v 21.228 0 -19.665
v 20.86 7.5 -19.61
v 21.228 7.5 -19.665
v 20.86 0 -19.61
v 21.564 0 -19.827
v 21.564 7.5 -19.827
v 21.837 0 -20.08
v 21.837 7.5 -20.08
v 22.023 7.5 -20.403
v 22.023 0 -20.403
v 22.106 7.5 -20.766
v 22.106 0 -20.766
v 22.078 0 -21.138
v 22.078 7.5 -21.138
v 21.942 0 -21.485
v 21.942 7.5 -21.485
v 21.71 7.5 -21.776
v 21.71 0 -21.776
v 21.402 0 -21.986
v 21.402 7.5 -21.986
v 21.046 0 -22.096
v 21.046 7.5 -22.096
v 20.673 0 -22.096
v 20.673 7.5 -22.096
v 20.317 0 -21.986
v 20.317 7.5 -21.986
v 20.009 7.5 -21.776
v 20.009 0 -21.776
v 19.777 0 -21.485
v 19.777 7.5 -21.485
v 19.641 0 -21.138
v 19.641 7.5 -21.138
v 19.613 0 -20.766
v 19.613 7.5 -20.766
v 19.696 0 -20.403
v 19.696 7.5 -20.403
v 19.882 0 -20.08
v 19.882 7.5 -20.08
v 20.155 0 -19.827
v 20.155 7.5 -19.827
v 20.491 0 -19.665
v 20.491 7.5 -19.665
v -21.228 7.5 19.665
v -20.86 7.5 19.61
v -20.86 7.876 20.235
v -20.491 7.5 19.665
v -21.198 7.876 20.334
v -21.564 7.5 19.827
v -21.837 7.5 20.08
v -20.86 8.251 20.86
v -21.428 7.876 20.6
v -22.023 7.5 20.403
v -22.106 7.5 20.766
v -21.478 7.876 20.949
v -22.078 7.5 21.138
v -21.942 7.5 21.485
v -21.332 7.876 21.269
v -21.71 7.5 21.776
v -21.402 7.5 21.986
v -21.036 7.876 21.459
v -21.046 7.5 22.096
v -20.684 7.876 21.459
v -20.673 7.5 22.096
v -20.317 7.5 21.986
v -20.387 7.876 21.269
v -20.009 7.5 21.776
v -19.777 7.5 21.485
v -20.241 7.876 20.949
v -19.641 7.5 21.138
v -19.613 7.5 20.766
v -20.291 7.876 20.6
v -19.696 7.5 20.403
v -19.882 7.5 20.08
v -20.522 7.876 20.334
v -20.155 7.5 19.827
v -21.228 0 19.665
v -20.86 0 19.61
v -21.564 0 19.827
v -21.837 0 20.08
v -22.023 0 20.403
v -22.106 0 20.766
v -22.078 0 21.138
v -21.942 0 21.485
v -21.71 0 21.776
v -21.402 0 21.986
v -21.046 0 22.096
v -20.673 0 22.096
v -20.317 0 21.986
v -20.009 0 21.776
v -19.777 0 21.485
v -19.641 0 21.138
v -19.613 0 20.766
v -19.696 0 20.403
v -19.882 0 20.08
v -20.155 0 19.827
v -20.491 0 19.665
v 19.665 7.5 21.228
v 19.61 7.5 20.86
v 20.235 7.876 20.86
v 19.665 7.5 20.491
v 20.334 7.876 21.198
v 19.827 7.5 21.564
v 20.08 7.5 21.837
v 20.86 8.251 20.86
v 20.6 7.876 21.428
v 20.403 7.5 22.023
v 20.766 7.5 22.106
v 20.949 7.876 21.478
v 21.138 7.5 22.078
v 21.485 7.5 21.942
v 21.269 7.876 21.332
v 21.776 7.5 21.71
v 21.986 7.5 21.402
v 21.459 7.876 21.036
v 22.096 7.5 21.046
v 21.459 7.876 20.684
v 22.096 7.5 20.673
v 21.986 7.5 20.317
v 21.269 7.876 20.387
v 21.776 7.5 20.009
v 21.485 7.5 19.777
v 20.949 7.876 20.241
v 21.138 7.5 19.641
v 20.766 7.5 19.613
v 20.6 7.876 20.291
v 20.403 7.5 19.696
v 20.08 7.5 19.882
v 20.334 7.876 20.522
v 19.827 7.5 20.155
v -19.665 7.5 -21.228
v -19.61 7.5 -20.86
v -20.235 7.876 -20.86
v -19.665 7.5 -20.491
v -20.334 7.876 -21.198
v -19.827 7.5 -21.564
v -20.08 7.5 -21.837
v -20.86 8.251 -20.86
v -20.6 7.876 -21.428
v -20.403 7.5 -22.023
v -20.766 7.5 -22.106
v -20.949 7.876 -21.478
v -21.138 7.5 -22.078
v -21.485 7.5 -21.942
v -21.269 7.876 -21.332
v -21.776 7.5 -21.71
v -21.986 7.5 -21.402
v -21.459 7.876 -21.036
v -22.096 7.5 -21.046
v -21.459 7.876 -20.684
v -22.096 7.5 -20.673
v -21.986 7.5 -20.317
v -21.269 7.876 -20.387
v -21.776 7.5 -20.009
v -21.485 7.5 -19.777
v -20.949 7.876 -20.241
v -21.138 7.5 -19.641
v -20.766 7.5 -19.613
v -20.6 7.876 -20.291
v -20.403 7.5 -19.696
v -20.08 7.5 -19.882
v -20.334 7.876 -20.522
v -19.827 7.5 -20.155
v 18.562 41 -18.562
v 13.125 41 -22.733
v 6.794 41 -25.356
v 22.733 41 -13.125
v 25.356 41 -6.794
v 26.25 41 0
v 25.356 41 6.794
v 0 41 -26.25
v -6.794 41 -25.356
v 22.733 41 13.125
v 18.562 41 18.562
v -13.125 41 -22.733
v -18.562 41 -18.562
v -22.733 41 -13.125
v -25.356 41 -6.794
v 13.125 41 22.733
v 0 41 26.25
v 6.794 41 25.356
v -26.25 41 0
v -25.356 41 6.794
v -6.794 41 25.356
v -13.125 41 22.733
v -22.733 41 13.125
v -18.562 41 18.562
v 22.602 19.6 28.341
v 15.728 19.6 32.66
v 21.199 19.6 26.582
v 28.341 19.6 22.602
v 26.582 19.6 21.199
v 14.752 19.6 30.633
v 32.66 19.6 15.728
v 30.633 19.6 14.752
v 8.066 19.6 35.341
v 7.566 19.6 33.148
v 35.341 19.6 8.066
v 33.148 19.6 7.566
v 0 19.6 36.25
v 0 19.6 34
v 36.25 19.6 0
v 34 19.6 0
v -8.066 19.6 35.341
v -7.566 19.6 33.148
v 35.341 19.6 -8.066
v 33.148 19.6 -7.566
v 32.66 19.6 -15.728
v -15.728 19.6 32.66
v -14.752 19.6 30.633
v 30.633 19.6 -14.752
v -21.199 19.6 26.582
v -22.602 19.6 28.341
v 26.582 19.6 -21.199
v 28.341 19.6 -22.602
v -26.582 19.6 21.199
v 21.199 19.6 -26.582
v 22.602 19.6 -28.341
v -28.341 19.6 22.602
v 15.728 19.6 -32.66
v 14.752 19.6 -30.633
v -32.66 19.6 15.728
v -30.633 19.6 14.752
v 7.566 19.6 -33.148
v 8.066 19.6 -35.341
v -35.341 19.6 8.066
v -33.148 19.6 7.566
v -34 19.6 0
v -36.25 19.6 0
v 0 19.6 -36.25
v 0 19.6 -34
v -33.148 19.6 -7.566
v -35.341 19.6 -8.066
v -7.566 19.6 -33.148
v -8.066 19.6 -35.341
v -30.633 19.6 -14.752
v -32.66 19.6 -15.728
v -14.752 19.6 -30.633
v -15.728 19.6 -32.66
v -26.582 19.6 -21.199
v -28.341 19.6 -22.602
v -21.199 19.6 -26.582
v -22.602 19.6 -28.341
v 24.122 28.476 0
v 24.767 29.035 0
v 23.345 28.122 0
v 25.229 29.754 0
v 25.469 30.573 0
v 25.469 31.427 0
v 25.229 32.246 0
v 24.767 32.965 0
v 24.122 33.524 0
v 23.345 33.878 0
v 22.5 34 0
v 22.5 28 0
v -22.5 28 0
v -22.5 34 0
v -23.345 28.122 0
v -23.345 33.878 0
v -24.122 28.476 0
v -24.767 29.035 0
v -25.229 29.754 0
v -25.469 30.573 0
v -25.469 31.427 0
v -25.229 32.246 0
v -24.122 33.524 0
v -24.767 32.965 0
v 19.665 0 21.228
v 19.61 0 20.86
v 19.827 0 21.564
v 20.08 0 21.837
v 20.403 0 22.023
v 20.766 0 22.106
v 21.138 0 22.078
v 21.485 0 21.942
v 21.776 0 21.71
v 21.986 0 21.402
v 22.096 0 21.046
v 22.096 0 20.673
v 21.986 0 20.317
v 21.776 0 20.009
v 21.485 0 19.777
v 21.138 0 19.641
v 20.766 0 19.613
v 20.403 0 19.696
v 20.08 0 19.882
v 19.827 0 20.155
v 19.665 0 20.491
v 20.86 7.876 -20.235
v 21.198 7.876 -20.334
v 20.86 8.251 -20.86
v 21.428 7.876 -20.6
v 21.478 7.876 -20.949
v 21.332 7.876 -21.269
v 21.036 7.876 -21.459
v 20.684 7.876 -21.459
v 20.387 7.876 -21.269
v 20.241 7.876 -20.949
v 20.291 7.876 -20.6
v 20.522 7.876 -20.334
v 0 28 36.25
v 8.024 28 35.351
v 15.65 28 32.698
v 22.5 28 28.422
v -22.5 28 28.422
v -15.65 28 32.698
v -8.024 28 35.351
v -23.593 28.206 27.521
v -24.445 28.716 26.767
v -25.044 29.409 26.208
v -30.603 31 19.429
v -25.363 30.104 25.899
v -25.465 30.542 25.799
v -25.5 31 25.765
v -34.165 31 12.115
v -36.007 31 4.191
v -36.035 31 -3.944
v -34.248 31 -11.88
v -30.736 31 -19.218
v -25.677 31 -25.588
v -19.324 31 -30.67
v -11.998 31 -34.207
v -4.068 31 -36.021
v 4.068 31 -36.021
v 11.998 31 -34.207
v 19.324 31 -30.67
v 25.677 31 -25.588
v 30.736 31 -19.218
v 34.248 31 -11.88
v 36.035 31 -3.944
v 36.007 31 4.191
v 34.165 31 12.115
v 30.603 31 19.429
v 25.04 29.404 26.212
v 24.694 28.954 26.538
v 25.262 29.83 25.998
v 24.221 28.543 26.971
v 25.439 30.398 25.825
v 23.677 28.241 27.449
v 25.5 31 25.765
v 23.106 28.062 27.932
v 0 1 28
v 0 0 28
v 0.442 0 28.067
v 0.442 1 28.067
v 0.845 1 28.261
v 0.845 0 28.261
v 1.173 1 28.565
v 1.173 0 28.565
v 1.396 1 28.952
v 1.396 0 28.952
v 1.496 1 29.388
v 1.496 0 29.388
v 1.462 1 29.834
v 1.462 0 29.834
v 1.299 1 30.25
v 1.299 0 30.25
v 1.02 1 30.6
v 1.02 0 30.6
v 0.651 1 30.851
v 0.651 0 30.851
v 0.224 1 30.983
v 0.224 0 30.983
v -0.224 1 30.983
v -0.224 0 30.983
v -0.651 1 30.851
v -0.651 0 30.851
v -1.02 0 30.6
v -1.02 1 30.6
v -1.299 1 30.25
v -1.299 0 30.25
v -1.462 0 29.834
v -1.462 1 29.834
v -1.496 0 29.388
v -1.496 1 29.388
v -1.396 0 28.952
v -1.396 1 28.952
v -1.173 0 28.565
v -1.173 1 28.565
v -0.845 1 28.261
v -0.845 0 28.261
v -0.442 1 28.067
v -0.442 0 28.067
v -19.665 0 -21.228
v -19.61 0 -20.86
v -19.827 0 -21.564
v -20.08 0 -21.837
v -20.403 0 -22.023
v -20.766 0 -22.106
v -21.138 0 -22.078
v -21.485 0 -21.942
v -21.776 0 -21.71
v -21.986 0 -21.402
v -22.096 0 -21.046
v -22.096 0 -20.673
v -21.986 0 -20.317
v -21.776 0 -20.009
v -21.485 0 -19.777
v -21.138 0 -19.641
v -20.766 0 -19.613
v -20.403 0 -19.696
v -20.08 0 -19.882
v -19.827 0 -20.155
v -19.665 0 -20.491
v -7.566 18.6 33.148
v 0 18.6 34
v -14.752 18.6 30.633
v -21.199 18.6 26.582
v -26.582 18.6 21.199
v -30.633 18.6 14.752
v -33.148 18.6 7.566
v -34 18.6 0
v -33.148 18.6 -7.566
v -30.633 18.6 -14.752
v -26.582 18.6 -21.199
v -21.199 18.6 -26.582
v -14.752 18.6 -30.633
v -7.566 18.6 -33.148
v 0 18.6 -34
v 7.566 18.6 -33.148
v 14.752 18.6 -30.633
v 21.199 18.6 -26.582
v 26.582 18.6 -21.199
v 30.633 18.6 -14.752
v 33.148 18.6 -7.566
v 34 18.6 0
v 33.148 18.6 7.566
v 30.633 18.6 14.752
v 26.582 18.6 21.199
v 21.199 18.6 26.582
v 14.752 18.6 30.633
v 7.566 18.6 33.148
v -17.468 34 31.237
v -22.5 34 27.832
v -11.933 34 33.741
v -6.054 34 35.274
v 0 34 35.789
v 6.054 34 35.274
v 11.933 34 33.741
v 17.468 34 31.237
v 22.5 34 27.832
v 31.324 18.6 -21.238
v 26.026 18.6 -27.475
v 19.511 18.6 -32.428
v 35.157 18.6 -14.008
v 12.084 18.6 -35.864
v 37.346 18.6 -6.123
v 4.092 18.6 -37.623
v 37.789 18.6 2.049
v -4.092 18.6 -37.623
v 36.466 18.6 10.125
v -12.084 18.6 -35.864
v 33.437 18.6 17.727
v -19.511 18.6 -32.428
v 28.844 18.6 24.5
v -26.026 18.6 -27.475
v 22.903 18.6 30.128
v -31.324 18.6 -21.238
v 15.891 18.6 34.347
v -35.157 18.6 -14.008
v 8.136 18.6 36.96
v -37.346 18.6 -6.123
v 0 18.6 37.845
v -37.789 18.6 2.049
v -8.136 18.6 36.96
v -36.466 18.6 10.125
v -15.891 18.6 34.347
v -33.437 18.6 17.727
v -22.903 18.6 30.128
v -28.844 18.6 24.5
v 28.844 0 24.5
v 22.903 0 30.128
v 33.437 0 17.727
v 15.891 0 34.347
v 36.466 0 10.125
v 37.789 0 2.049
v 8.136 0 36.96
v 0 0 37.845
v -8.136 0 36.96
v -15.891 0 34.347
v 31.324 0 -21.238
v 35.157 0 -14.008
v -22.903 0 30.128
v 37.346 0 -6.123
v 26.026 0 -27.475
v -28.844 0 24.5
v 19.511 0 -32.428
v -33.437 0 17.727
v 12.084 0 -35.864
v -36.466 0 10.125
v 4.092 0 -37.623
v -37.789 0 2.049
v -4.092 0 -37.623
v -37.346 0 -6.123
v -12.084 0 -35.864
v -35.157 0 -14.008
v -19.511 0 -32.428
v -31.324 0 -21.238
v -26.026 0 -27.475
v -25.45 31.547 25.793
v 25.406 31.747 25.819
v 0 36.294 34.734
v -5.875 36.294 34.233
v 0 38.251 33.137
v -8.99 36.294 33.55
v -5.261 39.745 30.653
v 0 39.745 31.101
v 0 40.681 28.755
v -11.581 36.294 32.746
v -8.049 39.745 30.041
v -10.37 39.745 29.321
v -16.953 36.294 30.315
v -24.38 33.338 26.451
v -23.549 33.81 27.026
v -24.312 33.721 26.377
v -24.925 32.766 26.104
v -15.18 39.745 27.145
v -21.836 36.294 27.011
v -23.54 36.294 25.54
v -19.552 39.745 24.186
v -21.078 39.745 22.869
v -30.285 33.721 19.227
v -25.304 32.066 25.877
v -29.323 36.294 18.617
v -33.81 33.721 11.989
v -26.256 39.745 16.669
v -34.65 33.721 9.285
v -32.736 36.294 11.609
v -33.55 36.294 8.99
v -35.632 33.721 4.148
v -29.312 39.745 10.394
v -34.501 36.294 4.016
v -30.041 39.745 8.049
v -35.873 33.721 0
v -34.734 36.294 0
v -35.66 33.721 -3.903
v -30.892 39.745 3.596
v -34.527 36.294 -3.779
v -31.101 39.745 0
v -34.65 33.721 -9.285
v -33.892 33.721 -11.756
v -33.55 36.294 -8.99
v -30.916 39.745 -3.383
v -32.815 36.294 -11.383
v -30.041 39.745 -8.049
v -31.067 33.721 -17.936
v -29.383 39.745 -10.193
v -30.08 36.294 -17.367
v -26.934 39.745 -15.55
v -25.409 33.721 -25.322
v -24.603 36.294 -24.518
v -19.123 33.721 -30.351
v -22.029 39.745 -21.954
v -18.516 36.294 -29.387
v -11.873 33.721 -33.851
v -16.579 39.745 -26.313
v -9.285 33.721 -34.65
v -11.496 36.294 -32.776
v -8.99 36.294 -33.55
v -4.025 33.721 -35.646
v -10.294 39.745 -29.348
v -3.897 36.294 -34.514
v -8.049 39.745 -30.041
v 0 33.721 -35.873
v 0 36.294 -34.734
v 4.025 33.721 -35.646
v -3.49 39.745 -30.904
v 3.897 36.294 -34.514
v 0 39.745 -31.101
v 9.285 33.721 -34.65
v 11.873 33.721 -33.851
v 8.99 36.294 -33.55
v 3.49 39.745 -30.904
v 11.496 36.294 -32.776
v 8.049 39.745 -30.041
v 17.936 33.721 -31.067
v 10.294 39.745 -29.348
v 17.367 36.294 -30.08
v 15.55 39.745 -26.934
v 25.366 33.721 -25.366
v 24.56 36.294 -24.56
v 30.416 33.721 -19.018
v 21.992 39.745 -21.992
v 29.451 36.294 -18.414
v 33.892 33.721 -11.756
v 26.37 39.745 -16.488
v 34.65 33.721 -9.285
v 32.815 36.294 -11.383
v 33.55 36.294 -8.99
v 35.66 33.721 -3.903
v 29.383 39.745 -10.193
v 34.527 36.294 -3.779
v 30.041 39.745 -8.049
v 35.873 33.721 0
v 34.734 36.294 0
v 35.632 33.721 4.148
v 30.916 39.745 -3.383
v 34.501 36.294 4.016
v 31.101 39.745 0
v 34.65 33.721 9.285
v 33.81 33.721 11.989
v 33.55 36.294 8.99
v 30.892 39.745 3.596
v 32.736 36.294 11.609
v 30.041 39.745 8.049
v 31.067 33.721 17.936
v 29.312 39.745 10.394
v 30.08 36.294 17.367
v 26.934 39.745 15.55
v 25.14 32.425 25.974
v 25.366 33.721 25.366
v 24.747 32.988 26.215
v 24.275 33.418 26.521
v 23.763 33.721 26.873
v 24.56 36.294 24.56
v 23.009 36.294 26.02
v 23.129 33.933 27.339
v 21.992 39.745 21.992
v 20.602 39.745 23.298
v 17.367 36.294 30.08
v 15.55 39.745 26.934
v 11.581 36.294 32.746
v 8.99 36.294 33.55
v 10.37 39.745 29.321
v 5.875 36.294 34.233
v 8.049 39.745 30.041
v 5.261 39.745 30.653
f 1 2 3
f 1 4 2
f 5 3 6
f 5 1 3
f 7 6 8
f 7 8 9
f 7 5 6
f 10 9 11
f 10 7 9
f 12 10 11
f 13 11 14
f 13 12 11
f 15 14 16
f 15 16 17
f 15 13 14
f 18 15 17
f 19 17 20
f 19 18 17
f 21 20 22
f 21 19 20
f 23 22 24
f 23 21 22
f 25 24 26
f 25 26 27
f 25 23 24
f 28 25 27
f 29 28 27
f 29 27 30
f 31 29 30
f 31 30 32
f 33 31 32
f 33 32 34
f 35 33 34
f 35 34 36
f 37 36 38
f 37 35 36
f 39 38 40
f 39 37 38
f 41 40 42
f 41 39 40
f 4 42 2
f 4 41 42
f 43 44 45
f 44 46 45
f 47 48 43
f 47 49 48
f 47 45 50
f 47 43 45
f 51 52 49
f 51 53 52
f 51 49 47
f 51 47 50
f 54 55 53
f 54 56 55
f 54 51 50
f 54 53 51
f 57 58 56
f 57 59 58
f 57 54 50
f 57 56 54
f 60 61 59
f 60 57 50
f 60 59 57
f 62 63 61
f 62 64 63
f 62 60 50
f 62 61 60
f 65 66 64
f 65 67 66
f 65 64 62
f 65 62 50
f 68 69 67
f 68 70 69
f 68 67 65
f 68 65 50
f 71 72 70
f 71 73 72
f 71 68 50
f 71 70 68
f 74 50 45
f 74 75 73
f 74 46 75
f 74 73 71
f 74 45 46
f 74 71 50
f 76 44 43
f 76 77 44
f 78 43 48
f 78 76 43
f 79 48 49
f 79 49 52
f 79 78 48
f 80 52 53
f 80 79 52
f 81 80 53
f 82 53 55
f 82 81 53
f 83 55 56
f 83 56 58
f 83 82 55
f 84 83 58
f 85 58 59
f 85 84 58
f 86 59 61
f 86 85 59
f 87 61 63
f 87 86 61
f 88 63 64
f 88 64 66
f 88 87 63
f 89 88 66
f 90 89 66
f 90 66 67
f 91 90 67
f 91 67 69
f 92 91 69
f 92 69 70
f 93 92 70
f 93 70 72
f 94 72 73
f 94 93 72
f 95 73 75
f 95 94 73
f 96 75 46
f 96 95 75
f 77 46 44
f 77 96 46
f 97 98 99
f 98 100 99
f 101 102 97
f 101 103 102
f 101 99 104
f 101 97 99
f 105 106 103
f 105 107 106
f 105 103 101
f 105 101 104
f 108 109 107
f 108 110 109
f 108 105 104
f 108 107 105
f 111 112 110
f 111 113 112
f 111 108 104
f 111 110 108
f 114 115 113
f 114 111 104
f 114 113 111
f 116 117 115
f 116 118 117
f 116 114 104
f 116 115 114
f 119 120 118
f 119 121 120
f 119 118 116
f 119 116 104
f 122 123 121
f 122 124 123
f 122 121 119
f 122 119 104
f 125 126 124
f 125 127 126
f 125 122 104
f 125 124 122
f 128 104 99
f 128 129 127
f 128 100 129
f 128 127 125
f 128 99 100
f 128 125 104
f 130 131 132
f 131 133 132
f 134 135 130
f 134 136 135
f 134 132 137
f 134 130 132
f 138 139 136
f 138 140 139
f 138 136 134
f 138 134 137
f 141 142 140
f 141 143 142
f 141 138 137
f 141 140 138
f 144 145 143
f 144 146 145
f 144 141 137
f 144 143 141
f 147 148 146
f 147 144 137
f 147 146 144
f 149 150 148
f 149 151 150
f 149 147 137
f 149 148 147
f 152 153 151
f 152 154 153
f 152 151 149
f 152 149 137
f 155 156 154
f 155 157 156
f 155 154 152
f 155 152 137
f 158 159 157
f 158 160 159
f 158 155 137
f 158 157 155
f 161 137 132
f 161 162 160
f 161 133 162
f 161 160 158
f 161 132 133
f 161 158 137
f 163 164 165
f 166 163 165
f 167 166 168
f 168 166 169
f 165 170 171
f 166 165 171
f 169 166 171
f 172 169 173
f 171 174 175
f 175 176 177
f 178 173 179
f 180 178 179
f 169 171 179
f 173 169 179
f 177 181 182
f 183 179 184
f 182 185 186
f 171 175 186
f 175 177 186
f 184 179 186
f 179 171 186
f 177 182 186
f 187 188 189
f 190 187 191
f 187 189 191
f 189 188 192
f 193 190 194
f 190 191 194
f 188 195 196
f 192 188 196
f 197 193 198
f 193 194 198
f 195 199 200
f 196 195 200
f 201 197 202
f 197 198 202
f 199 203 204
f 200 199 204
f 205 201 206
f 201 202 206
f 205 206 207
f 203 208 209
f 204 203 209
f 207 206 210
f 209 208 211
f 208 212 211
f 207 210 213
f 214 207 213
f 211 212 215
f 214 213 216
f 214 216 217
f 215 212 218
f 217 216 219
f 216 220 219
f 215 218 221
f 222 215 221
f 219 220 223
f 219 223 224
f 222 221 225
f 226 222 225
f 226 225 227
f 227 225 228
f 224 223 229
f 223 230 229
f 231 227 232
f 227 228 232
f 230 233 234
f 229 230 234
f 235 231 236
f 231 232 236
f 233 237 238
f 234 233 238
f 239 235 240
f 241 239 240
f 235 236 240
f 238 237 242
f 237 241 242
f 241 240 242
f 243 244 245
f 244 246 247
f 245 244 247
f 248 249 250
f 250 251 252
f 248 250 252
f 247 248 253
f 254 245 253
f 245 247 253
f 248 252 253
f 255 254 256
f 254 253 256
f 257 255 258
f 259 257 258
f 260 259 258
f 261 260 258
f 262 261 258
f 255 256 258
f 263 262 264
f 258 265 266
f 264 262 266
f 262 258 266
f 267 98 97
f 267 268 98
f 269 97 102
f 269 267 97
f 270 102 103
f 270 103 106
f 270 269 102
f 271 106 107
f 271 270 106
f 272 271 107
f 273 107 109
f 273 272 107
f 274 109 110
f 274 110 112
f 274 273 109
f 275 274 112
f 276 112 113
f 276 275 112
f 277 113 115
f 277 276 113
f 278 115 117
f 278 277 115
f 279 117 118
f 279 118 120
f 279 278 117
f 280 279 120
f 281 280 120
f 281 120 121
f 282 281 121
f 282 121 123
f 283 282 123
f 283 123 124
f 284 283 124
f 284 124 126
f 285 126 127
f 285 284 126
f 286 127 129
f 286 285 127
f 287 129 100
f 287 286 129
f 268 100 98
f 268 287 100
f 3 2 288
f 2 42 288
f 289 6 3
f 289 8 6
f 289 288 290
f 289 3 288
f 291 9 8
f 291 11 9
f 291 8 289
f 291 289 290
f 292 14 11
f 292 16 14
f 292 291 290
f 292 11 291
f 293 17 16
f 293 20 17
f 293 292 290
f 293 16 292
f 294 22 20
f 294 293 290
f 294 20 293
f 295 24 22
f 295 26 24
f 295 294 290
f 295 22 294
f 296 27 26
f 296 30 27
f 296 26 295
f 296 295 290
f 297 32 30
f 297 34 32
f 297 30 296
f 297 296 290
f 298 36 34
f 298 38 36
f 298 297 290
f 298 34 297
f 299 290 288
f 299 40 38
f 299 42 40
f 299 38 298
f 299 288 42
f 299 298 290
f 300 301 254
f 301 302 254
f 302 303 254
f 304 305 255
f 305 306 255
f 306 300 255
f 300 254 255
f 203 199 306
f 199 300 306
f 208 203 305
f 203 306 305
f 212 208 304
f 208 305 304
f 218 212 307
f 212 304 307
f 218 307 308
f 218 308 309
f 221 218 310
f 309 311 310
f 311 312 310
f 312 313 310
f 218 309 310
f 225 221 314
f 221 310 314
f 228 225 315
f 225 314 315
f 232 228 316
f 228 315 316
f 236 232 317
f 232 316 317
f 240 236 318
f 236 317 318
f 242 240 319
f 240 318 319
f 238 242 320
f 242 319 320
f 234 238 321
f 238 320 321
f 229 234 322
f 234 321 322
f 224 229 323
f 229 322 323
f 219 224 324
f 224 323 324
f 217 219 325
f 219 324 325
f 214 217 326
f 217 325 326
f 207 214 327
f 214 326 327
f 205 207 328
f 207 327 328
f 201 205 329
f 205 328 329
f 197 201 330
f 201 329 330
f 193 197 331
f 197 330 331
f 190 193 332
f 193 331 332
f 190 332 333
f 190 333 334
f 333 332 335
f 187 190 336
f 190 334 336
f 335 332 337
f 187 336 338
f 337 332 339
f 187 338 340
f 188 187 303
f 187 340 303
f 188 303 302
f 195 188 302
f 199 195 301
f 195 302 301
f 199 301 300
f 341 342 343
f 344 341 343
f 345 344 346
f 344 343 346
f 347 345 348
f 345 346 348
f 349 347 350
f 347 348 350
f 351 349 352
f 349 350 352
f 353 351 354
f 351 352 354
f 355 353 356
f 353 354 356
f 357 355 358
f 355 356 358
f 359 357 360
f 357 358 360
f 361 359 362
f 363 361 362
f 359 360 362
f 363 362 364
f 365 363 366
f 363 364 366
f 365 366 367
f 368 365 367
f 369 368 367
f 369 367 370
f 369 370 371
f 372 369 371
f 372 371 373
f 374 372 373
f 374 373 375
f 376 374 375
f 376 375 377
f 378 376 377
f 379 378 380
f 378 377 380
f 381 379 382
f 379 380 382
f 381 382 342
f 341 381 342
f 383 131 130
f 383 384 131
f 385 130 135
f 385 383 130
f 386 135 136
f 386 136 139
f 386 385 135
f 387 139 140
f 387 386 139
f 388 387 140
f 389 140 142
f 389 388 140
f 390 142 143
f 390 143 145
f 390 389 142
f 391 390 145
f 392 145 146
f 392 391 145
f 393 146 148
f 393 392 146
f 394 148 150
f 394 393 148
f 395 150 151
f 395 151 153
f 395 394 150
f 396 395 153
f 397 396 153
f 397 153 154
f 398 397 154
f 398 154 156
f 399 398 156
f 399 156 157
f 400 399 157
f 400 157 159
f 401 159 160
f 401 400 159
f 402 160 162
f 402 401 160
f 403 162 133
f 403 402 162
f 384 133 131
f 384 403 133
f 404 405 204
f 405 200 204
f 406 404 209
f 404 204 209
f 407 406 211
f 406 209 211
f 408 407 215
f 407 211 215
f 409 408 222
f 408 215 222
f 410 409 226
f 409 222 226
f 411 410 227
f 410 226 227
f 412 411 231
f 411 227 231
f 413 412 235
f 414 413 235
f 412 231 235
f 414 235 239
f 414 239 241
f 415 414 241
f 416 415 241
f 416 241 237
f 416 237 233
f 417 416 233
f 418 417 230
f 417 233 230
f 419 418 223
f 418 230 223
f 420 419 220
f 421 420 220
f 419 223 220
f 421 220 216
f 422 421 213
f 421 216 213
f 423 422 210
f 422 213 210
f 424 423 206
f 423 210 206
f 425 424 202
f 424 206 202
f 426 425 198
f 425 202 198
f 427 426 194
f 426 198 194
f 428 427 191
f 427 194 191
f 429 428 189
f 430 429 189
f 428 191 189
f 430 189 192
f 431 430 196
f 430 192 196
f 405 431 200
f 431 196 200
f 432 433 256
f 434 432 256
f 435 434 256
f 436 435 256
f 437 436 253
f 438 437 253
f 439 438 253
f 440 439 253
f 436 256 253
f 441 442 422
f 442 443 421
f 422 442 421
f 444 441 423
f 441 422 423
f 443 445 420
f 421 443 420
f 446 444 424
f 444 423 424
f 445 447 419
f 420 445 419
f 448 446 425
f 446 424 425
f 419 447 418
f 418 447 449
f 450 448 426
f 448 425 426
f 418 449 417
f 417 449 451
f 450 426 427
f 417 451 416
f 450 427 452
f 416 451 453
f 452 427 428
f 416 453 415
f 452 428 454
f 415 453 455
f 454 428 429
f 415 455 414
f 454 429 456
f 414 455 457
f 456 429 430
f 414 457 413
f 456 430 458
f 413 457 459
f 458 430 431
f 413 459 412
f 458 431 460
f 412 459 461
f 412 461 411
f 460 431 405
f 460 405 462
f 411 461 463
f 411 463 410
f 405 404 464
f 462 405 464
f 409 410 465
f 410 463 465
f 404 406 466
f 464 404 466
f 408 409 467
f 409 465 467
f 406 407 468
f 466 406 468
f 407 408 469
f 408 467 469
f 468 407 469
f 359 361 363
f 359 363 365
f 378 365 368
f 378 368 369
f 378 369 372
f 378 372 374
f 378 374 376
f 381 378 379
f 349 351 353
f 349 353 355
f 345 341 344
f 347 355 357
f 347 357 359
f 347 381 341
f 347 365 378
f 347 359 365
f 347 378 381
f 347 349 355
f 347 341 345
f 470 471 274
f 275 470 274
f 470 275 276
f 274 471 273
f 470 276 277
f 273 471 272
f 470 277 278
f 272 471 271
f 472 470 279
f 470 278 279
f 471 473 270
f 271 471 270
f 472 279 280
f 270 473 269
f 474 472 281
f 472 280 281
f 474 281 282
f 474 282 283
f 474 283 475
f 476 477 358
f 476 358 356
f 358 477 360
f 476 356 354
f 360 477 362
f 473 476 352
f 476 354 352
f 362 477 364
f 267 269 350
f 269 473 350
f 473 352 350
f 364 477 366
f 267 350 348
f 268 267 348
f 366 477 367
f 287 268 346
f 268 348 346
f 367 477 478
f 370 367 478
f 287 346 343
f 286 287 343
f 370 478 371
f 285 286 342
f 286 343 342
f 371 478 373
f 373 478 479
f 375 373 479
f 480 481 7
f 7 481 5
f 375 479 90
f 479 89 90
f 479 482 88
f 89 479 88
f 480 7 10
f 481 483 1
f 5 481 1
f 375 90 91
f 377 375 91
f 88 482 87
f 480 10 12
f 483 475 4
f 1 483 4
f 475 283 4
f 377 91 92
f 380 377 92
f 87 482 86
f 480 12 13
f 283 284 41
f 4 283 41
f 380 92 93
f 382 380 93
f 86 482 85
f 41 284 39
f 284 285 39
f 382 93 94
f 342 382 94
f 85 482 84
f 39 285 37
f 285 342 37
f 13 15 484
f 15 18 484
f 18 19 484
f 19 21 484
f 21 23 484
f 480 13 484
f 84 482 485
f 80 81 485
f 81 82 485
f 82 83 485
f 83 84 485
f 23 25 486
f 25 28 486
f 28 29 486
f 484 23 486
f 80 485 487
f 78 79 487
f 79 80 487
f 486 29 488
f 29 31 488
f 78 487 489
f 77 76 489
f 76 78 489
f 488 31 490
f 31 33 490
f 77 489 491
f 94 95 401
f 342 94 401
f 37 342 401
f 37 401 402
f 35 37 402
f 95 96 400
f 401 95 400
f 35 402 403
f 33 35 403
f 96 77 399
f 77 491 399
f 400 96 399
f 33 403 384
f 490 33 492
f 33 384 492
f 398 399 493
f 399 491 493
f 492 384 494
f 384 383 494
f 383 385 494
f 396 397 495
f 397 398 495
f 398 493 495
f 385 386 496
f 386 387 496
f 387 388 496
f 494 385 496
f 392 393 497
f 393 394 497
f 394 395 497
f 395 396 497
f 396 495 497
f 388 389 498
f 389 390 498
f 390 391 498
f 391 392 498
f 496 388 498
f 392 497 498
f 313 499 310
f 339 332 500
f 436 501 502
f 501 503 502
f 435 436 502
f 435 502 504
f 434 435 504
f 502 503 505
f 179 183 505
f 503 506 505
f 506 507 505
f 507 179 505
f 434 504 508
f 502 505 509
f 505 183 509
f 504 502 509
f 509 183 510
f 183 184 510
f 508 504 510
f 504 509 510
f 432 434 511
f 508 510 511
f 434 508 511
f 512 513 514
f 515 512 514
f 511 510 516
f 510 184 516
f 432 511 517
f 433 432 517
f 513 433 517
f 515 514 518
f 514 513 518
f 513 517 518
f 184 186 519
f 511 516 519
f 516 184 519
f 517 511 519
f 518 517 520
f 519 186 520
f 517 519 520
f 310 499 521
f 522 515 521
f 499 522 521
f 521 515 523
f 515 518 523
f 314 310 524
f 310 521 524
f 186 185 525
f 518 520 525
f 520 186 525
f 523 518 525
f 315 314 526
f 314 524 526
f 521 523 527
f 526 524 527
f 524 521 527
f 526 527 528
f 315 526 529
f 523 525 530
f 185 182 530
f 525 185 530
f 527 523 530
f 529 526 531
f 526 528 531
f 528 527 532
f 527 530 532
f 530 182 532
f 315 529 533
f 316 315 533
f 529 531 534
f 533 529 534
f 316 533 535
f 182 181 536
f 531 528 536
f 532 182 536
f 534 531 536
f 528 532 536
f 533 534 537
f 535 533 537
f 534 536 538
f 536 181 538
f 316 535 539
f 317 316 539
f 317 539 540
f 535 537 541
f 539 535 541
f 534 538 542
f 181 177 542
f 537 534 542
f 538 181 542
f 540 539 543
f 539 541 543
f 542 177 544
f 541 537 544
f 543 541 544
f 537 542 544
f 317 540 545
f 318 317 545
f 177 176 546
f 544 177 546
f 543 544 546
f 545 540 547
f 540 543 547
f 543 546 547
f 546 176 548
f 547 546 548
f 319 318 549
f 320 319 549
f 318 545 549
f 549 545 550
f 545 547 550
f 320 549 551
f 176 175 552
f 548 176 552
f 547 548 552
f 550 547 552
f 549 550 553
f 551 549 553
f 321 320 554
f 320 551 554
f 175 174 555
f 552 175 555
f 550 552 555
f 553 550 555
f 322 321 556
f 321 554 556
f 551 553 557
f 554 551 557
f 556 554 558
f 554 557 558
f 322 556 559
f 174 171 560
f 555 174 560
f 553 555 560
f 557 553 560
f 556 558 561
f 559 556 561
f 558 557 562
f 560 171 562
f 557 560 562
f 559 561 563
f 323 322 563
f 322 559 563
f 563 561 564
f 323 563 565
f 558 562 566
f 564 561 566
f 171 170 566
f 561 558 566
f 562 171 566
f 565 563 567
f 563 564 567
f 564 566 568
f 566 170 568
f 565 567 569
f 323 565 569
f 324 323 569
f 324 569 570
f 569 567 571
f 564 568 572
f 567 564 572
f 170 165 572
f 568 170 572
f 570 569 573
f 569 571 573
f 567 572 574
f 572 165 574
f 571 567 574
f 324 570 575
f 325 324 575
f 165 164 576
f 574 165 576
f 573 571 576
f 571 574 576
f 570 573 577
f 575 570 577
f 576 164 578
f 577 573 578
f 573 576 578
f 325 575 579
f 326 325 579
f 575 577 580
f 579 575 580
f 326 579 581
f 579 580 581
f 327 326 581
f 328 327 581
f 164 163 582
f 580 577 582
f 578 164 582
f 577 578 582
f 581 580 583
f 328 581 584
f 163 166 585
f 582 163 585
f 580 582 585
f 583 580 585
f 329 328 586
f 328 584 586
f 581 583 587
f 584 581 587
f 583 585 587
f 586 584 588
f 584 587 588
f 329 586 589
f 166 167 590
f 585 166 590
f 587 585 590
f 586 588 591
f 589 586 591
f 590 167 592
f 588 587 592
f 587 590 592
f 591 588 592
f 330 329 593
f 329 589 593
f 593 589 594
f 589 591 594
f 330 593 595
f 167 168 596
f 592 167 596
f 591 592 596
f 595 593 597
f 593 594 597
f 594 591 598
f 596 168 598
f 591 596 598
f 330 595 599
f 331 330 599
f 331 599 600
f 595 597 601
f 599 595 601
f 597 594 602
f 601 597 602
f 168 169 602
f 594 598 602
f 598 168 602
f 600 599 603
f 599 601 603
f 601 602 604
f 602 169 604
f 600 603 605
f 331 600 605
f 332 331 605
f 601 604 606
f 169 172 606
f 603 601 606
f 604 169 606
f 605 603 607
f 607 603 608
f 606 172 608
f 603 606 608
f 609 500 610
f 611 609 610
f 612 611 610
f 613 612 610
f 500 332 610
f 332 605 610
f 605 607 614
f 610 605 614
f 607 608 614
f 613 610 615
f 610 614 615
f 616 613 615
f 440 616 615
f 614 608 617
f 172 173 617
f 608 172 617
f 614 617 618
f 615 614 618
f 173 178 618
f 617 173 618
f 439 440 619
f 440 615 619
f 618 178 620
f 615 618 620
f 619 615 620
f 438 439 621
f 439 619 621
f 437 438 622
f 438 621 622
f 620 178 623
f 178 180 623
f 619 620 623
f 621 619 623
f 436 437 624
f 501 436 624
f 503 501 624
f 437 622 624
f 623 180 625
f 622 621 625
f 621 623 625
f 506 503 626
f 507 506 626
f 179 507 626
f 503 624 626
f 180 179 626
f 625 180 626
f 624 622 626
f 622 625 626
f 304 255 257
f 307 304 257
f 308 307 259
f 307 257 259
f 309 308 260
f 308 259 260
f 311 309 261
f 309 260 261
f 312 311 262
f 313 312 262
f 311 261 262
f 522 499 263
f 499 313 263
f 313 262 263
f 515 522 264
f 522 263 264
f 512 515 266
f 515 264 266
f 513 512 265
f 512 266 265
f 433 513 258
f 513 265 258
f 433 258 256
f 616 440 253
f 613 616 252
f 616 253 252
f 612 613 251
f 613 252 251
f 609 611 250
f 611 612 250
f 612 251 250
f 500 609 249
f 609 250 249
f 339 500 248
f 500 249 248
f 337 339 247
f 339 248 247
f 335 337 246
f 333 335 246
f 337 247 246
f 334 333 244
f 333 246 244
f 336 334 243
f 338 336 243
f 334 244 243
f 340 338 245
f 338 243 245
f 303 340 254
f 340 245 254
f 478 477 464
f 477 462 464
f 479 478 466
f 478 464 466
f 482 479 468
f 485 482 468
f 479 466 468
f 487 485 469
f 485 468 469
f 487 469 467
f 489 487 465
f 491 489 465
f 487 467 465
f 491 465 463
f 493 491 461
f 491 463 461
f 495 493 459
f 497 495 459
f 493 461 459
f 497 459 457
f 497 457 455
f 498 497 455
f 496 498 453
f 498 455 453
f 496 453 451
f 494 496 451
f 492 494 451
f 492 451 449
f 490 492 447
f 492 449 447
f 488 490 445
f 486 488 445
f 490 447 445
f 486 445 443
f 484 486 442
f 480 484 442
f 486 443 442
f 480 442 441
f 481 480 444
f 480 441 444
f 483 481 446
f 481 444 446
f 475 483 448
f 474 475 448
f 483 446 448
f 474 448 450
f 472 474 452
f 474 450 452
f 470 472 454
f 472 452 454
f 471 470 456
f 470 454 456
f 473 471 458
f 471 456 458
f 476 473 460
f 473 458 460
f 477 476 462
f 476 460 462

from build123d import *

# Parameters (mm, degrees)
SKETCH_2_R               = 1.5
CUT_EXTRUDE_1_DEPTH      = 1
PATTERN_CIRCULAR_1_COUNT = 4
FILLET_1_R               = 10
CUT_EXTRUDE_2_DEPTH      = 68.420234722


with BuildPart() as part:
    # 草图1 → 旋转1 (revolve)
    with BuildSketch(Plane.XY, mode=Mode.PRIVATE) as revolve_1_sk:
        Polygon((0, 0), (-37.845, 0), (-37.845, 18.6), (-34, 18.6), (-34, 19.6), (-36.25, 19.6), (-36.25, 41), (0, 41), align=None)
    revolve(revolve_1_sk.sketch.rotate(Axis((0, 49.444830204, 0), (0, -1, 0)), 270), axis=Axis((0, 49.444830204, 0), (0, -1, 0)))

    # 草图2 → 切除-拉伸1 (cut)
    with BuildSketch(Plane.XZ):
        with Locations(Location((0, 29.5, 0), (0, 0, 270))):
            Circle(SKETCH_2_R)
    extrude(amount=-CUT_EXTRUDE_1_DEPTH, mode=Mode.SUBTRACT)

    # 草图4 → g (revolve, cut)
    with BuildSketch(Plane(origin=(-20.859650045, 0, 20.859650045), x_dir=(0, 0, -1), z_dir=(1, 0, 0))):
        Polygon((0, 0), (0, 8.251075774), (1.25, 7.5), (1.25, 0), align=None)
    hole_wizard_g = revolve(axis=Axis((-20.859650045, -6.35, 20.859650045), (0, 1, 0)), mode=Mode.SUBTRACT)

    # 阵列(圆周)1: g ×4 about axis
    pattern_circular_1_axis = Axis((0, 0, 0), (0, 1, 0))
    for i in range(1, PATTERN_CIRCULAR_1_COUNT):
        add(hole_wizard_g.rotate(pattern_circular_1_axis, i * 360 / PATTERN_CIRCULAR_1_COUNT), mode=Mode.SUBTRACT)

    # 圆角1
    fillet_1_edges = [part.edges().sort_by_distance(p)[0] for p in [
        (0, 41, -36.25),
    ]]
    fillet(fillet_1_edges, radius=FILLET_1_R)

    # 草图5 → 切除-拉伸2 (cut, through all)
    with BuildSketch(Plane.XY):
        with BuildLine():
            Line((-22.5, 34), (22.5, 34))
            ThreePointArc((22.5, 34), (25.5, 31), (22.5, 28))
            Line((22.5, 28), (-22.5, 28))
            ThreePointArc((-22.5, 28), (-25.5, 31), (-22.5, 34))
        make_face()
    extrude(amount=CUT_EXTRUDE_2_DEPTH, mode=Mode.SUBTRACT)


solid = part.part
